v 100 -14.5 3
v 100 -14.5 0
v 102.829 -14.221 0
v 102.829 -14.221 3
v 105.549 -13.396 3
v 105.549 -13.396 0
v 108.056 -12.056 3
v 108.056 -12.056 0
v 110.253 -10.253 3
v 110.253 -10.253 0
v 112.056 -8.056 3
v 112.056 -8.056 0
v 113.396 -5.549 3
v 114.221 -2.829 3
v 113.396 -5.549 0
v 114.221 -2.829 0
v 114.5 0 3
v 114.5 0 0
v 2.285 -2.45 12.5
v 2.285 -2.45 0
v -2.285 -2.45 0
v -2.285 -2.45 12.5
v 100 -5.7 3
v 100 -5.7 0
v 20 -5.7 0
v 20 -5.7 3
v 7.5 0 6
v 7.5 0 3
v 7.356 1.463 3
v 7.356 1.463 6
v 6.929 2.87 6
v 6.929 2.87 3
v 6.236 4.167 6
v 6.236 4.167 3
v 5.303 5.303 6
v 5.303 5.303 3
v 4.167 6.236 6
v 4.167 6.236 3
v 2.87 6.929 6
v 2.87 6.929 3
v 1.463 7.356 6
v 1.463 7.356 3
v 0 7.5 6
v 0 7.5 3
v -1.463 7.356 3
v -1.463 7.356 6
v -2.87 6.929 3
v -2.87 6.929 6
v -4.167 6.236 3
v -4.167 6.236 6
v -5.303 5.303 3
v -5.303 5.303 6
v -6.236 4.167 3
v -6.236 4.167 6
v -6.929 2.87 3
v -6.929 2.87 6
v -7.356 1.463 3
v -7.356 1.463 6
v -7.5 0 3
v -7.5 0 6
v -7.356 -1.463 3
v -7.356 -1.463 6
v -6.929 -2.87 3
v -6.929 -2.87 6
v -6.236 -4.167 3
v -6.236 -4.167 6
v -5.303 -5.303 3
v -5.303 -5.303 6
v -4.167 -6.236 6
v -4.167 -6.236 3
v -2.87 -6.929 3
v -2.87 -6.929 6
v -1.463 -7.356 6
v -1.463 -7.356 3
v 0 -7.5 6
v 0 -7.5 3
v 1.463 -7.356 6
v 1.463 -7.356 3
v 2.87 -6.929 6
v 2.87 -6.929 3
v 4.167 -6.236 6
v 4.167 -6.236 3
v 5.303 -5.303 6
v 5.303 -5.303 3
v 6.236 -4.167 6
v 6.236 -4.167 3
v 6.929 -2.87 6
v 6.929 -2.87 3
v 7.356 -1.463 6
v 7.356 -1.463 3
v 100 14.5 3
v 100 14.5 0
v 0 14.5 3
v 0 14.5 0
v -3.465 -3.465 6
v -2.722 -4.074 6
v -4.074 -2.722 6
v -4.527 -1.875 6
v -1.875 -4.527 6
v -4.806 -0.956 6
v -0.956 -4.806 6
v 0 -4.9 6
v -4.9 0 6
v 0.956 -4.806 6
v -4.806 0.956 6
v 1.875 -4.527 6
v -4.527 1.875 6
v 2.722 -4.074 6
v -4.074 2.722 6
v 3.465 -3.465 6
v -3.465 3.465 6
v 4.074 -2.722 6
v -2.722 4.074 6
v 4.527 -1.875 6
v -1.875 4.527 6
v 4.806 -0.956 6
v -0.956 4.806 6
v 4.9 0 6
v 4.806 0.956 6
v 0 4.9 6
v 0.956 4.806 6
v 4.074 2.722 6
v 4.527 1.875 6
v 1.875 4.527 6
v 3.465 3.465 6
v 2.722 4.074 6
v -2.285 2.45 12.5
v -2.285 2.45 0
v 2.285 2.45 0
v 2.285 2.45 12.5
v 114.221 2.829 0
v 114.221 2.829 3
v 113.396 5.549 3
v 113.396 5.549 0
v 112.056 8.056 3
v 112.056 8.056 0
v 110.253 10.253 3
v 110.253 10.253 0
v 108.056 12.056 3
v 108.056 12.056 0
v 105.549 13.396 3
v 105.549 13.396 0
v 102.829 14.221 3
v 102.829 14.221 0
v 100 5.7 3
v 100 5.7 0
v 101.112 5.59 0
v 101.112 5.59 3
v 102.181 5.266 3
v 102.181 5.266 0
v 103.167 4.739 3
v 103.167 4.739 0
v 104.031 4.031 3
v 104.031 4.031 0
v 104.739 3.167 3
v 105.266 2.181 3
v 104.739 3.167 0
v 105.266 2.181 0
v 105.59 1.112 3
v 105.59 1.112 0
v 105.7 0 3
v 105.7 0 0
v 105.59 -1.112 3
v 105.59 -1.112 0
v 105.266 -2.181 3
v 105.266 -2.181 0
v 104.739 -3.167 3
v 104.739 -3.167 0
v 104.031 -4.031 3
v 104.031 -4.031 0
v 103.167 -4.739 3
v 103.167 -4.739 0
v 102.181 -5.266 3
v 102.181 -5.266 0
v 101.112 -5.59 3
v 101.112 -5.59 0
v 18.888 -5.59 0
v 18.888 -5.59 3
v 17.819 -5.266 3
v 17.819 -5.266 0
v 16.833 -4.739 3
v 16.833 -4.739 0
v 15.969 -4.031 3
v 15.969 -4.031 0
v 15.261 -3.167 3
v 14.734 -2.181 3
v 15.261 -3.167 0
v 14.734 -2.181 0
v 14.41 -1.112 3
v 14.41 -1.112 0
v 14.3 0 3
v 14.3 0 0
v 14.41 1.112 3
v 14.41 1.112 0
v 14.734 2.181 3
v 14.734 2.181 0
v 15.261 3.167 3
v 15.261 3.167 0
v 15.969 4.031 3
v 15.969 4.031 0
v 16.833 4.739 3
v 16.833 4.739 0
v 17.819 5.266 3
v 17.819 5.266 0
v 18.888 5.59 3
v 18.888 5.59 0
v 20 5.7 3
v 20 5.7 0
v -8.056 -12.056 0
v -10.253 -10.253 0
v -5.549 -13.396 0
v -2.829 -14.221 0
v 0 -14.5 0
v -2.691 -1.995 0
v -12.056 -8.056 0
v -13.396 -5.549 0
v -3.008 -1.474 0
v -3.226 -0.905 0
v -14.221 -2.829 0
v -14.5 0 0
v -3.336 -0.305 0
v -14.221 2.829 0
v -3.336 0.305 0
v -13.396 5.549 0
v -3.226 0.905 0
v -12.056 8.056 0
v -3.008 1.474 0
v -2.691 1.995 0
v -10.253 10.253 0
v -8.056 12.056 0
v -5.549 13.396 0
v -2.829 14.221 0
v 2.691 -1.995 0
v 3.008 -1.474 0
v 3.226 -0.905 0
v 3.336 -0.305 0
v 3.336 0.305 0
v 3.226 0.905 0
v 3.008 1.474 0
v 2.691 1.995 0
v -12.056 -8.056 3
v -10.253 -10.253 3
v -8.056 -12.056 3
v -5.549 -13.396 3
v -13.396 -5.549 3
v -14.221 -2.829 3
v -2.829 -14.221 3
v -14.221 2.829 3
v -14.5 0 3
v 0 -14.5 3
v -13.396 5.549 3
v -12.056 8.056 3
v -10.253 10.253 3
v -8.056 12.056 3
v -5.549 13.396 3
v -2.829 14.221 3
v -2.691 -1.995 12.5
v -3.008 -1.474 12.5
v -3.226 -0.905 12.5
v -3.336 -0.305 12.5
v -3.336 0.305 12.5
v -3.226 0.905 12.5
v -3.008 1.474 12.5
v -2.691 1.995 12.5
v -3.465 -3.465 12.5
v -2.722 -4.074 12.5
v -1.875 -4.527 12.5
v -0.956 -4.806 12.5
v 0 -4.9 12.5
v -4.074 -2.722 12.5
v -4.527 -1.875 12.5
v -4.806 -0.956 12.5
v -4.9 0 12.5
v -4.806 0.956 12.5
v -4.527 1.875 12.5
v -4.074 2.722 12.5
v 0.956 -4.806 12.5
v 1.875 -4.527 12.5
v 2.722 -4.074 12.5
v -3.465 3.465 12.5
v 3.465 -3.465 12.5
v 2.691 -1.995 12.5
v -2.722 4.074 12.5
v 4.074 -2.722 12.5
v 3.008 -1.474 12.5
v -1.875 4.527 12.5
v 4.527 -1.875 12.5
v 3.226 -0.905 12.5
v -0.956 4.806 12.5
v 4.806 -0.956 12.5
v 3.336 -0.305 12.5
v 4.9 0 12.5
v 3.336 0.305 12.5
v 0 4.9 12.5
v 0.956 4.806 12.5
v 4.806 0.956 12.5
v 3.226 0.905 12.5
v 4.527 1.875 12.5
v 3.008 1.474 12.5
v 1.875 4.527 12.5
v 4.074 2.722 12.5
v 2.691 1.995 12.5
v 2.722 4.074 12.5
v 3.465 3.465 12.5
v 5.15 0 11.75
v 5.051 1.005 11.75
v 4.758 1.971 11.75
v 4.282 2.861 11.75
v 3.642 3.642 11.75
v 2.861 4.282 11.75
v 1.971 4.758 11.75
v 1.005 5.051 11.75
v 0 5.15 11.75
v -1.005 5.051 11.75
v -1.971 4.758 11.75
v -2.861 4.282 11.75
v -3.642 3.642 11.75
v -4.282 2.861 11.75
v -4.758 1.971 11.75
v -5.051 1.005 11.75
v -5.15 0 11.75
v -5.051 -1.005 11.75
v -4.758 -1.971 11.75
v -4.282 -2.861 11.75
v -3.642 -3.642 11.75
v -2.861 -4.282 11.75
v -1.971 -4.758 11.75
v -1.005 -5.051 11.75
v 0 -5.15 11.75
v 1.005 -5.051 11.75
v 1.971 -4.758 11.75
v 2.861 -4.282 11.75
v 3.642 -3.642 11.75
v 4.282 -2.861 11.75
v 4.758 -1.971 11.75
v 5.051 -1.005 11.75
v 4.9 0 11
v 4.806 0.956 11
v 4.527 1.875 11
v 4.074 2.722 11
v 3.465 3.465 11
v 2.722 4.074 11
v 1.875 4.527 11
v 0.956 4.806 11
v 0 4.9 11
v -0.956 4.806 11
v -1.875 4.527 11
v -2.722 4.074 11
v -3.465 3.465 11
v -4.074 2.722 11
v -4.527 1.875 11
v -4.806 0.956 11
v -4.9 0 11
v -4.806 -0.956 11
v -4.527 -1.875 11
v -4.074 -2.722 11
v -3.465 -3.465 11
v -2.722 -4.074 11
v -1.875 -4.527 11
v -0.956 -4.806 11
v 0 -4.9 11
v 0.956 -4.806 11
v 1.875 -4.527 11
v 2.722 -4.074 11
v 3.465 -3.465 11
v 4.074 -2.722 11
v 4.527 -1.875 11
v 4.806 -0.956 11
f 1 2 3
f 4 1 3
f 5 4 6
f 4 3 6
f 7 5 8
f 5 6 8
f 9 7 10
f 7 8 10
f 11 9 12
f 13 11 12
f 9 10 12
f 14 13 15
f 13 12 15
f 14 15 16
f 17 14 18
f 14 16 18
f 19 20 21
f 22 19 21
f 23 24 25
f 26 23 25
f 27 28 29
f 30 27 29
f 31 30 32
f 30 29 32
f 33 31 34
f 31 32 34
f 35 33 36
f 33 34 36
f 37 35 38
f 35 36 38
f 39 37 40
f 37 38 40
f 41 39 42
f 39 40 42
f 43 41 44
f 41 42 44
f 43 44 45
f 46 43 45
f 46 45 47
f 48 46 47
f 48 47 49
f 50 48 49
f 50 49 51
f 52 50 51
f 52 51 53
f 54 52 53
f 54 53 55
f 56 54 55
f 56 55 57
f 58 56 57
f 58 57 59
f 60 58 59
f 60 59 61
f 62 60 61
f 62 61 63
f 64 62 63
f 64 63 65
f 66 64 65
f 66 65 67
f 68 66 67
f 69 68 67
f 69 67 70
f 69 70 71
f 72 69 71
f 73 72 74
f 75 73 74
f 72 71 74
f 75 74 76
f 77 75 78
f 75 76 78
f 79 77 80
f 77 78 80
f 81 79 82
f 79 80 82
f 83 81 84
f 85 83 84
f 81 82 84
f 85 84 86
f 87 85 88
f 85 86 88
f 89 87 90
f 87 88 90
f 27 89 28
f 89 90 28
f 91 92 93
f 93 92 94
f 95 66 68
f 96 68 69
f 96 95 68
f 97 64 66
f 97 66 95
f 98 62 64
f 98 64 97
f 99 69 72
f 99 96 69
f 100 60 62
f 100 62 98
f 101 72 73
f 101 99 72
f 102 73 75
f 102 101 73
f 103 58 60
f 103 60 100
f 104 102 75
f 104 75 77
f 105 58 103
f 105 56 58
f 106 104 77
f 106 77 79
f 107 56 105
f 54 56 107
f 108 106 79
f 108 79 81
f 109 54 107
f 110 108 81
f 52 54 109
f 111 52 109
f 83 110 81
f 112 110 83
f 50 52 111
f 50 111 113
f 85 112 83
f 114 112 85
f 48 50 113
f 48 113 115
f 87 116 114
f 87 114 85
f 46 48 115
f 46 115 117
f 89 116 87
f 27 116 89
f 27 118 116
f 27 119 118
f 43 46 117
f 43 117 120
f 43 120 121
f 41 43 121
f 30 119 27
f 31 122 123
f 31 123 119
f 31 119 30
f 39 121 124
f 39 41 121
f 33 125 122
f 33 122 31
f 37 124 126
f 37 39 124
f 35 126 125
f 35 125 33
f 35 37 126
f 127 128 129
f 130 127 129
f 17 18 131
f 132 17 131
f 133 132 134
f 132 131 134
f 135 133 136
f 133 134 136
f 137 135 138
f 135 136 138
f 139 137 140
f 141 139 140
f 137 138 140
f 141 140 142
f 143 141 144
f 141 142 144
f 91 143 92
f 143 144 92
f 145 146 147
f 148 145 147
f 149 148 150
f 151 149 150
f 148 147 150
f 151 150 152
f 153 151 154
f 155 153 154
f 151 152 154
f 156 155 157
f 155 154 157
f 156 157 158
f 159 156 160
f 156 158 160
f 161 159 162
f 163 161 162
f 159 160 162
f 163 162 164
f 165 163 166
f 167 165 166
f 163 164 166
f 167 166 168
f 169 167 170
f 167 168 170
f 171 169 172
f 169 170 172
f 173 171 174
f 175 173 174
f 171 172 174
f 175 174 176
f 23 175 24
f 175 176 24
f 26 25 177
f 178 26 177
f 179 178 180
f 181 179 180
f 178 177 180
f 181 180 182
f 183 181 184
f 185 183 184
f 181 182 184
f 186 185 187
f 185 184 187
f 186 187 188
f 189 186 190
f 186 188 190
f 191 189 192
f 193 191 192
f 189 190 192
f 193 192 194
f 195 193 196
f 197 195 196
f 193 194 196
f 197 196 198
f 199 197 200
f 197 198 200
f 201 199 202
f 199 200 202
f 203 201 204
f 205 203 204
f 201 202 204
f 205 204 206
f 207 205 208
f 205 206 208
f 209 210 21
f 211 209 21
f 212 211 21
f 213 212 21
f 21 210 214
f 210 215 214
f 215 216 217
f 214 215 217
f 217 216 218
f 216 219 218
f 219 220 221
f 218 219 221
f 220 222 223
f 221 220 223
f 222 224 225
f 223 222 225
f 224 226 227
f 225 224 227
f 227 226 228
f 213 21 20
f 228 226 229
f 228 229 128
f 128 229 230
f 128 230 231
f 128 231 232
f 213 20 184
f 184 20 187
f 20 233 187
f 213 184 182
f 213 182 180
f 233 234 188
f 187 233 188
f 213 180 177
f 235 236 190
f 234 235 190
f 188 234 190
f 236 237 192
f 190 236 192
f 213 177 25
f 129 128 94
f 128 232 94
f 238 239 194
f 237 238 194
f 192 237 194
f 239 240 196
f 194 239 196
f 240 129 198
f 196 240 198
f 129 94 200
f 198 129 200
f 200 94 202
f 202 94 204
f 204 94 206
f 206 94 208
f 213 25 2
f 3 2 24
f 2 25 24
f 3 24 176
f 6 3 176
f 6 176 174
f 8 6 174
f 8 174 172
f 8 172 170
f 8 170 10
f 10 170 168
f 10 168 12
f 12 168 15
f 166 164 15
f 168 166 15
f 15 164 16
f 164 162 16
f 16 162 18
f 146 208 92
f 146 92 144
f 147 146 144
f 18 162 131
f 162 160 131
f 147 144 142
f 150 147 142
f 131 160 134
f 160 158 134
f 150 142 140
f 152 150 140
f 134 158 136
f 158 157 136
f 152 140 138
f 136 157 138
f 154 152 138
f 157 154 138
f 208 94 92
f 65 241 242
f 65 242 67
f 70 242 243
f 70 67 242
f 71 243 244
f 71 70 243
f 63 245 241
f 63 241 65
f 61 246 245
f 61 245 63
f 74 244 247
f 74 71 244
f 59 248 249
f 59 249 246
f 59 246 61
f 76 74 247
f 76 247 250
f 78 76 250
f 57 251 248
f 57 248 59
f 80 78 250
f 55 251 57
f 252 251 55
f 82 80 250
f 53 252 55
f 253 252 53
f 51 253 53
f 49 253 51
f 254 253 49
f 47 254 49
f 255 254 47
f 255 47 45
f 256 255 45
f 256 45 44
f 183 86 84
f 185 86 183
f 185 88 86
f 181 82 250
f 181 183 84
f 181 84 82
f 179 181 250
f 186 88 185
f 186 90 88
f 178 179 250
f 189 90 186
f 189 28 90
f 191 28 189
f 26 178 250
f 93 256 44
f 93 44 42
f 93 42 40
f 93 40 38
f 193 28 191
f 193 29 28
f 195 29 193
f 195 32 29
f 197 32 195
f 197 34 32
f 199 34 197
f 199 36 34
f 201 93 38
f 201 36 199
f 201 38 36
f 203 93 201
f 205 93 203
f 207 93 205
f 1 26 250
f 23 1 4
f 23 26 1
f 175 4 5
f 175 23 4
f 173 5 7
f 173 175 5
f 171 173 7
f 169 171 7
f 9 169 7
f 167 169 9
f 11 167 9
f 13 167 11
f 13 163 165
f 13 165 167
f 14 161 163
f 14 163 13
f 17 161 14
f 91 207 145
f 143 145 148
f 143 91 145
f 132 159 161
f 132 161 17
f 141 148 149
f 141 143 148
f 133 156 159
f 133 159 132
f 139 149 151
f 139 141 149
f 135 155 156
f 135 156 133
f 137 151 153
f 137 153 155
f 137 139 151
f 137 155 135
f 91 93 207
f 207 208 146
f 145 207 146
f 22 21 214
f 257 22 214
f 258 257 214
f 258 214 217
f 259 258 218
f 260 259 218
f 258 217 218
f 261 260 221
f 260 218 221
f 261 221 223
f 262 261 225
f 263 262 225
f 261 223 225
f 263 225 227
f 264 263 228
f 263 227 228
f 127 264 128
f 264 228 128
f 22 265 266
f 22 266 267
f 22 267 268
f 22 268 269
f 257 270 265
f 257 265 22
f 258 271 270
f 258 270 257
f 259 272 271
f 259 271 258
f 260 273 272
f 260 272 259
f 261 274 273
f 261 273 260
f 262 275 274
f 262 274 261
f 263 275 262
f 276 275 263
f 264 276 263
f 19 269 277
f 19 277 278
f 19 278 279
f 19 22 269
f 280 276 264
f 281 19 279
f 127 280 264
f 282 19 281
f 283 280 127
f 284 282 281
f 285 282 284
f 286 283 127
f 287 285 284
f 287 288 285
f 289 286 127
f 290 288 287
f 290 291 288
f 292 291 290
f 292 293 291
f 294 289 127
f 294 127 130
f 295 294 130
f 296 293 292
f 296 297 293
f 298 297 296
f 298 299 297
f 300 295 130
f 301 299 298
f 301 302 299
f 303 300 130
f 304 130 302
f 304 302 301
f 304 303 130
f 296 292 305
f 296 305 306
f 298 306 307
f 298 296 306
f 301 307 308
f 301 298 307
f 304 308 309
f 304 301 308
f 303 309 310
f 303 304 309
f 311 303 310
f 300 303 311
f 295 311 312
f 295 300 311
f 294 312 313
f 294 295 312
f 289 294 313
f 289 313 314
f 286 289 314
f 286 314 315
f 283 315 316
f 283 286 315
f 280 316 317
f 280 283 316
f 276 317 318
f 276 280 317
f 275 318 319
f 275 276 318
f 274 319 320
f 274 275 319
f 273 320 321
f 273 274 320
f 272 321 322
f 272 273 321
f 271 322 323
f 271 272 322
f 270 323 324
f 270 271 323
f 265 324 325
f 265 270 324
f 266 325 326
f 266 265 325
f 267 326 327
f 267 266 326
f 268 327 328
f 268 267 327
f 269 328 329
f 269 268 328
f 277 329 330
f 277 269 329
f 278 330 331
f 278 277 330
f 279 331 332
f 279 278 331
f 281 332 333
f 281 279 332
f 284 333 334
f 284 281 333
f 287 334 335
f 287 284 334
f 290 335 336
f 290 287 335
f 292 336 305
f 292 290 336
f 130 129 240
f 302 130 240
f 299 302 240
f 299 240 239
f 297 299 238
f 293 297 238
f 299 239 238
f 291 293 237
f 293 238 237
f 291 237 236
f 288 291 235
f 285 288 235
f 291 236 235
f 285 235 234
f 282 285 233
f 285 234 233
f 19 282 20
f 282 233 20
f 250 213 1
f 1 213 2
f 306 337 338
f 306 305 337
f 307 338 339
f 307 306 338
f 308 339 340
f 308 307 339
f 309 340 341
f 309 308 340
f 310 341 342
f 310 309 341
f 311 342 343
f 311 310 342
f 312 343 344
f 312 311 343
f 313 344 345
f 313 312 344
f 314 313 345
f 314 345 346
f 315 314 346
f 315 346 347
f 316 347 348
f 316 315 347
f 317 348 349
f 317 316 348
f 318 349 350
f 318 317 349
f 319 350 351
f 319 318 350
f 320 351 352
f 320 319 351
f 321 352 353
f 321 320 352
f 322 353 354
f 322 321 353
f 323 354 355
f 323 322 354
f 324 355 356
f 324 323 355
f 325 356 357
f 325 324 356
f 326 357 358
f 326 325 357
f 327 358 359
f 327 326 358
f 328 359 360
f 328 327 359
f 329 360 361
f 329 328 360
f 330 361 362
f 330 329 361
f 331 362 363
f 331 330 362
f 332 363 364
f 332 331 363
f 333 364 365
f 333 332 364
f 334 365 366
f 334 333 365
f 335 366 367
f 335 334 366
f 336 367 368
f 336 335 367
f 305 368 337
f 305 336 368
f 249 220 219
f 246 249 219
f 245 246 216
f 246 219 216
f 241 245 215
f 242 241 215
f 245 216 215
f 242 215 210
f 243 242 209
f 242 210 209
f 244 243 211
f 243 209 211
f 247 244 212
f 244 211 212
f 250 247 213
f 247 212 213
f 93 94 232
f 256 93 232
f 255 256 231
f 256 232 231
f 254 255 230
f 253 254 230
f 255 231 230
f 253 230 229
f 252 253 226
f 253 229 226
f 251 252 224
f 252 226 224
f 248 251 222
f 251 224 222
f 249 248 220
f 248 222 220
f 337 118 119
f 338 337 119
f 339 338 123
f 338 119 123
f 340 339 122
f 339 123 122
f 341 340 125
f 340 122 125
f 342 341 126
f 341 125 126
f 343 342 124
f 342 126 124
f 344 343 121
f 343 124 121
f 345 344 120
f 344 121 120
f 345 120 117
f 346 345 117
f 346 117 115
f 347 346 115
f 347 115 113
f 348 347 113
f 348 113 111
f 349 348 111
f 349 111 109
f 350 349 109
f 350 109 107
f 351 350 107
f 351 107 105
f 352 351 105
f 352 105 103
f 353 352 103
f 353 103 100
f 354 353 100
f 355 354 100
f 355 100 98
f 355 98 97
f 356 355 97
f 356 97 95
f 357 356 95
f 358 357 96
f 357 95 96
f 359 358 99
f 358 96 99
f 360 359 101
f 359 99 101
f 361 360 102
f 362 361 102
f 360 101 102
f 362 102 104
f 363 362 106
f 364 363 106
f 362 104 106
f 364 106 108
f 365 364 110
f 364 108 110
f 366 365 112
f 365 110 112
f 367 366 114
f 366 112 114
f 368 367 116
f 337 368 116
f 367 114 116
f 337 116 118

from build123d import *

# Parameters (mm, degrees)
F4_R      = 7.5
F4_R_2    = 5.5
F5_DEPTH  = 3
F6_DEPTH  = 5
F7_R      = 9.5
F7_R_2    = 7.5
F7_R_3    = 4.9
F8_DEPTH  = 3
F9_DEPTH  = 6
F10_DEPTH = 12.5


with BuildPart() as f5:
    # F4 (on Top) → F5 (new body)
    with BuildSketch(Plane.XY):
        with BuildLine():
            Line((100, 14.5), (0, 14.5))
            ThreePointArc((0, 14.5), (-10.2530483272, 10.2530483272), (-14.5, 0))
            ThreePointArc((-14.5, 0), (-10.2530483272, -10.2530483272), (0, -14.5))
            Line((0, -14.5), (100, -14.5))
            ThreePointArc((100, -14.5), (110.2530483272, -10.2530483272), (114.5, 0))
            ThreePointArc((114.5, 0), (110.2530483272, 10.2530483272), (100, 14.5))
        make_face()
        Circle(F4_R, mode=Mode.SUBTRACT)
        with BuildLine():
            ThreePointArc((20, -5.7), (14.3, 0), (20, 5.7))
            Line((20, 5.7), (100, 5.7))
            ThreePointArc((100, 5.7), (105.7, 0), (100, -5.7))
            Line((100, -5.7), (20, -5.7))
        make_face(mode=Mode.SUBTRACT)
        Circle(F4_R)
        Circle(F4_R_2, mode=Mode.SUBTRACT)
    extrude(amount=F5_DEPTH)

    # F4 (on Top) → F6 (join)
    with BuildSketch(Plane.XY):
        Circle(F4_R)
        Circle(F4_R_2, mode=Mode.SUBTRACT)
    extrude(amount=F6_DEPTH)



with BuildPart() as f8:
    # F7 (on Top) → F8 (new body)
    with BuildSketch(Plane.XY):
        Circle(F7_R)
        Circle(F7_R_2, mode=Mode.SUBTRACT)
        Circle(F7_R_2)
        Circle(F7_R_3, mode=Mode.SUBTRACT)
        Circle(F7_R_3)
        with BuildLine():
            ThreePointArc((-2.2847319318, -2.45), (-3.35, 0), (-2.2847319318, 2.45))
            Line((-2.2847319318, 2.45), (2.2847319318, 2.45))
            ThreePointArc((2.2847319318, 2.45), (3.35, 0), (2.2847319318, -2.45))
            Line((2.2847319318, -2.45), (-2.2847319318, -2.45))
        make_face(mode=Mode.SUBTRACT)
    extrude(amount=F8_DEPTH)


with BuildPart() as f5_1:
    add(f5.part)

    add(f8.part)  # F9 merges F8
    # F7 (on Top) → F9 (join)
    with BuildSketch(Plane.XY):
        Circle(F7_R_2)
        Circle(F7_R_3, mode=Mode.SUBTRACT)
        Circle(F7_R_3)
        with BuildLine():
            ThreePointArc((-2.2847319318, -2.45), (-3.35, 0), (-2.2847319318, 2.45))
            Line((-2.2847319318, 2.45), (2.2847319318, 2.45))
            ThreePointArc((2.2847319318, 2.45), (3.35, 0), (2.2847319318, -2.45))
            Line((2.2847319318, -2.45), (-2.2847319318, -2.45))
        make_face(mode=Mode.SUBTRACT)
    extrude(amount=F9_DEPTH)

    # F7 (on Top) → F10 (join)
    with BuildSketch(Plane.XY):
        Circle(F7_R_3)
        with BuildLine():
            ThreePointArc((-2.2847319318, -2.45), (-3.35, 0), (-2.2847319318, 2.45))
            Line((-2.2847319318, 2.45), (2.2847319318, 2.45))
            ThreePointArc((2.2847319318, 2.45), (3.35, 0), (2.2847319318, -2.45))
            Line((2.2847319318, -2.45), (-2.2847319318, -2.45))
        make_face(mode=Mode.SUBTRACT)
    extrude(amount=F10_DEPTH)

    # F11 (on Front) → F12 (revolve)
    with BuildSketch(Plane.XZ):
        Polygon((5.15, 11.75), (4.9, 12.5), (4.9, 11), align=None)
    revolve(axis=Axis((0, 0, 8.631802164), (0, 0, 1)))


solid = f5_1.part
